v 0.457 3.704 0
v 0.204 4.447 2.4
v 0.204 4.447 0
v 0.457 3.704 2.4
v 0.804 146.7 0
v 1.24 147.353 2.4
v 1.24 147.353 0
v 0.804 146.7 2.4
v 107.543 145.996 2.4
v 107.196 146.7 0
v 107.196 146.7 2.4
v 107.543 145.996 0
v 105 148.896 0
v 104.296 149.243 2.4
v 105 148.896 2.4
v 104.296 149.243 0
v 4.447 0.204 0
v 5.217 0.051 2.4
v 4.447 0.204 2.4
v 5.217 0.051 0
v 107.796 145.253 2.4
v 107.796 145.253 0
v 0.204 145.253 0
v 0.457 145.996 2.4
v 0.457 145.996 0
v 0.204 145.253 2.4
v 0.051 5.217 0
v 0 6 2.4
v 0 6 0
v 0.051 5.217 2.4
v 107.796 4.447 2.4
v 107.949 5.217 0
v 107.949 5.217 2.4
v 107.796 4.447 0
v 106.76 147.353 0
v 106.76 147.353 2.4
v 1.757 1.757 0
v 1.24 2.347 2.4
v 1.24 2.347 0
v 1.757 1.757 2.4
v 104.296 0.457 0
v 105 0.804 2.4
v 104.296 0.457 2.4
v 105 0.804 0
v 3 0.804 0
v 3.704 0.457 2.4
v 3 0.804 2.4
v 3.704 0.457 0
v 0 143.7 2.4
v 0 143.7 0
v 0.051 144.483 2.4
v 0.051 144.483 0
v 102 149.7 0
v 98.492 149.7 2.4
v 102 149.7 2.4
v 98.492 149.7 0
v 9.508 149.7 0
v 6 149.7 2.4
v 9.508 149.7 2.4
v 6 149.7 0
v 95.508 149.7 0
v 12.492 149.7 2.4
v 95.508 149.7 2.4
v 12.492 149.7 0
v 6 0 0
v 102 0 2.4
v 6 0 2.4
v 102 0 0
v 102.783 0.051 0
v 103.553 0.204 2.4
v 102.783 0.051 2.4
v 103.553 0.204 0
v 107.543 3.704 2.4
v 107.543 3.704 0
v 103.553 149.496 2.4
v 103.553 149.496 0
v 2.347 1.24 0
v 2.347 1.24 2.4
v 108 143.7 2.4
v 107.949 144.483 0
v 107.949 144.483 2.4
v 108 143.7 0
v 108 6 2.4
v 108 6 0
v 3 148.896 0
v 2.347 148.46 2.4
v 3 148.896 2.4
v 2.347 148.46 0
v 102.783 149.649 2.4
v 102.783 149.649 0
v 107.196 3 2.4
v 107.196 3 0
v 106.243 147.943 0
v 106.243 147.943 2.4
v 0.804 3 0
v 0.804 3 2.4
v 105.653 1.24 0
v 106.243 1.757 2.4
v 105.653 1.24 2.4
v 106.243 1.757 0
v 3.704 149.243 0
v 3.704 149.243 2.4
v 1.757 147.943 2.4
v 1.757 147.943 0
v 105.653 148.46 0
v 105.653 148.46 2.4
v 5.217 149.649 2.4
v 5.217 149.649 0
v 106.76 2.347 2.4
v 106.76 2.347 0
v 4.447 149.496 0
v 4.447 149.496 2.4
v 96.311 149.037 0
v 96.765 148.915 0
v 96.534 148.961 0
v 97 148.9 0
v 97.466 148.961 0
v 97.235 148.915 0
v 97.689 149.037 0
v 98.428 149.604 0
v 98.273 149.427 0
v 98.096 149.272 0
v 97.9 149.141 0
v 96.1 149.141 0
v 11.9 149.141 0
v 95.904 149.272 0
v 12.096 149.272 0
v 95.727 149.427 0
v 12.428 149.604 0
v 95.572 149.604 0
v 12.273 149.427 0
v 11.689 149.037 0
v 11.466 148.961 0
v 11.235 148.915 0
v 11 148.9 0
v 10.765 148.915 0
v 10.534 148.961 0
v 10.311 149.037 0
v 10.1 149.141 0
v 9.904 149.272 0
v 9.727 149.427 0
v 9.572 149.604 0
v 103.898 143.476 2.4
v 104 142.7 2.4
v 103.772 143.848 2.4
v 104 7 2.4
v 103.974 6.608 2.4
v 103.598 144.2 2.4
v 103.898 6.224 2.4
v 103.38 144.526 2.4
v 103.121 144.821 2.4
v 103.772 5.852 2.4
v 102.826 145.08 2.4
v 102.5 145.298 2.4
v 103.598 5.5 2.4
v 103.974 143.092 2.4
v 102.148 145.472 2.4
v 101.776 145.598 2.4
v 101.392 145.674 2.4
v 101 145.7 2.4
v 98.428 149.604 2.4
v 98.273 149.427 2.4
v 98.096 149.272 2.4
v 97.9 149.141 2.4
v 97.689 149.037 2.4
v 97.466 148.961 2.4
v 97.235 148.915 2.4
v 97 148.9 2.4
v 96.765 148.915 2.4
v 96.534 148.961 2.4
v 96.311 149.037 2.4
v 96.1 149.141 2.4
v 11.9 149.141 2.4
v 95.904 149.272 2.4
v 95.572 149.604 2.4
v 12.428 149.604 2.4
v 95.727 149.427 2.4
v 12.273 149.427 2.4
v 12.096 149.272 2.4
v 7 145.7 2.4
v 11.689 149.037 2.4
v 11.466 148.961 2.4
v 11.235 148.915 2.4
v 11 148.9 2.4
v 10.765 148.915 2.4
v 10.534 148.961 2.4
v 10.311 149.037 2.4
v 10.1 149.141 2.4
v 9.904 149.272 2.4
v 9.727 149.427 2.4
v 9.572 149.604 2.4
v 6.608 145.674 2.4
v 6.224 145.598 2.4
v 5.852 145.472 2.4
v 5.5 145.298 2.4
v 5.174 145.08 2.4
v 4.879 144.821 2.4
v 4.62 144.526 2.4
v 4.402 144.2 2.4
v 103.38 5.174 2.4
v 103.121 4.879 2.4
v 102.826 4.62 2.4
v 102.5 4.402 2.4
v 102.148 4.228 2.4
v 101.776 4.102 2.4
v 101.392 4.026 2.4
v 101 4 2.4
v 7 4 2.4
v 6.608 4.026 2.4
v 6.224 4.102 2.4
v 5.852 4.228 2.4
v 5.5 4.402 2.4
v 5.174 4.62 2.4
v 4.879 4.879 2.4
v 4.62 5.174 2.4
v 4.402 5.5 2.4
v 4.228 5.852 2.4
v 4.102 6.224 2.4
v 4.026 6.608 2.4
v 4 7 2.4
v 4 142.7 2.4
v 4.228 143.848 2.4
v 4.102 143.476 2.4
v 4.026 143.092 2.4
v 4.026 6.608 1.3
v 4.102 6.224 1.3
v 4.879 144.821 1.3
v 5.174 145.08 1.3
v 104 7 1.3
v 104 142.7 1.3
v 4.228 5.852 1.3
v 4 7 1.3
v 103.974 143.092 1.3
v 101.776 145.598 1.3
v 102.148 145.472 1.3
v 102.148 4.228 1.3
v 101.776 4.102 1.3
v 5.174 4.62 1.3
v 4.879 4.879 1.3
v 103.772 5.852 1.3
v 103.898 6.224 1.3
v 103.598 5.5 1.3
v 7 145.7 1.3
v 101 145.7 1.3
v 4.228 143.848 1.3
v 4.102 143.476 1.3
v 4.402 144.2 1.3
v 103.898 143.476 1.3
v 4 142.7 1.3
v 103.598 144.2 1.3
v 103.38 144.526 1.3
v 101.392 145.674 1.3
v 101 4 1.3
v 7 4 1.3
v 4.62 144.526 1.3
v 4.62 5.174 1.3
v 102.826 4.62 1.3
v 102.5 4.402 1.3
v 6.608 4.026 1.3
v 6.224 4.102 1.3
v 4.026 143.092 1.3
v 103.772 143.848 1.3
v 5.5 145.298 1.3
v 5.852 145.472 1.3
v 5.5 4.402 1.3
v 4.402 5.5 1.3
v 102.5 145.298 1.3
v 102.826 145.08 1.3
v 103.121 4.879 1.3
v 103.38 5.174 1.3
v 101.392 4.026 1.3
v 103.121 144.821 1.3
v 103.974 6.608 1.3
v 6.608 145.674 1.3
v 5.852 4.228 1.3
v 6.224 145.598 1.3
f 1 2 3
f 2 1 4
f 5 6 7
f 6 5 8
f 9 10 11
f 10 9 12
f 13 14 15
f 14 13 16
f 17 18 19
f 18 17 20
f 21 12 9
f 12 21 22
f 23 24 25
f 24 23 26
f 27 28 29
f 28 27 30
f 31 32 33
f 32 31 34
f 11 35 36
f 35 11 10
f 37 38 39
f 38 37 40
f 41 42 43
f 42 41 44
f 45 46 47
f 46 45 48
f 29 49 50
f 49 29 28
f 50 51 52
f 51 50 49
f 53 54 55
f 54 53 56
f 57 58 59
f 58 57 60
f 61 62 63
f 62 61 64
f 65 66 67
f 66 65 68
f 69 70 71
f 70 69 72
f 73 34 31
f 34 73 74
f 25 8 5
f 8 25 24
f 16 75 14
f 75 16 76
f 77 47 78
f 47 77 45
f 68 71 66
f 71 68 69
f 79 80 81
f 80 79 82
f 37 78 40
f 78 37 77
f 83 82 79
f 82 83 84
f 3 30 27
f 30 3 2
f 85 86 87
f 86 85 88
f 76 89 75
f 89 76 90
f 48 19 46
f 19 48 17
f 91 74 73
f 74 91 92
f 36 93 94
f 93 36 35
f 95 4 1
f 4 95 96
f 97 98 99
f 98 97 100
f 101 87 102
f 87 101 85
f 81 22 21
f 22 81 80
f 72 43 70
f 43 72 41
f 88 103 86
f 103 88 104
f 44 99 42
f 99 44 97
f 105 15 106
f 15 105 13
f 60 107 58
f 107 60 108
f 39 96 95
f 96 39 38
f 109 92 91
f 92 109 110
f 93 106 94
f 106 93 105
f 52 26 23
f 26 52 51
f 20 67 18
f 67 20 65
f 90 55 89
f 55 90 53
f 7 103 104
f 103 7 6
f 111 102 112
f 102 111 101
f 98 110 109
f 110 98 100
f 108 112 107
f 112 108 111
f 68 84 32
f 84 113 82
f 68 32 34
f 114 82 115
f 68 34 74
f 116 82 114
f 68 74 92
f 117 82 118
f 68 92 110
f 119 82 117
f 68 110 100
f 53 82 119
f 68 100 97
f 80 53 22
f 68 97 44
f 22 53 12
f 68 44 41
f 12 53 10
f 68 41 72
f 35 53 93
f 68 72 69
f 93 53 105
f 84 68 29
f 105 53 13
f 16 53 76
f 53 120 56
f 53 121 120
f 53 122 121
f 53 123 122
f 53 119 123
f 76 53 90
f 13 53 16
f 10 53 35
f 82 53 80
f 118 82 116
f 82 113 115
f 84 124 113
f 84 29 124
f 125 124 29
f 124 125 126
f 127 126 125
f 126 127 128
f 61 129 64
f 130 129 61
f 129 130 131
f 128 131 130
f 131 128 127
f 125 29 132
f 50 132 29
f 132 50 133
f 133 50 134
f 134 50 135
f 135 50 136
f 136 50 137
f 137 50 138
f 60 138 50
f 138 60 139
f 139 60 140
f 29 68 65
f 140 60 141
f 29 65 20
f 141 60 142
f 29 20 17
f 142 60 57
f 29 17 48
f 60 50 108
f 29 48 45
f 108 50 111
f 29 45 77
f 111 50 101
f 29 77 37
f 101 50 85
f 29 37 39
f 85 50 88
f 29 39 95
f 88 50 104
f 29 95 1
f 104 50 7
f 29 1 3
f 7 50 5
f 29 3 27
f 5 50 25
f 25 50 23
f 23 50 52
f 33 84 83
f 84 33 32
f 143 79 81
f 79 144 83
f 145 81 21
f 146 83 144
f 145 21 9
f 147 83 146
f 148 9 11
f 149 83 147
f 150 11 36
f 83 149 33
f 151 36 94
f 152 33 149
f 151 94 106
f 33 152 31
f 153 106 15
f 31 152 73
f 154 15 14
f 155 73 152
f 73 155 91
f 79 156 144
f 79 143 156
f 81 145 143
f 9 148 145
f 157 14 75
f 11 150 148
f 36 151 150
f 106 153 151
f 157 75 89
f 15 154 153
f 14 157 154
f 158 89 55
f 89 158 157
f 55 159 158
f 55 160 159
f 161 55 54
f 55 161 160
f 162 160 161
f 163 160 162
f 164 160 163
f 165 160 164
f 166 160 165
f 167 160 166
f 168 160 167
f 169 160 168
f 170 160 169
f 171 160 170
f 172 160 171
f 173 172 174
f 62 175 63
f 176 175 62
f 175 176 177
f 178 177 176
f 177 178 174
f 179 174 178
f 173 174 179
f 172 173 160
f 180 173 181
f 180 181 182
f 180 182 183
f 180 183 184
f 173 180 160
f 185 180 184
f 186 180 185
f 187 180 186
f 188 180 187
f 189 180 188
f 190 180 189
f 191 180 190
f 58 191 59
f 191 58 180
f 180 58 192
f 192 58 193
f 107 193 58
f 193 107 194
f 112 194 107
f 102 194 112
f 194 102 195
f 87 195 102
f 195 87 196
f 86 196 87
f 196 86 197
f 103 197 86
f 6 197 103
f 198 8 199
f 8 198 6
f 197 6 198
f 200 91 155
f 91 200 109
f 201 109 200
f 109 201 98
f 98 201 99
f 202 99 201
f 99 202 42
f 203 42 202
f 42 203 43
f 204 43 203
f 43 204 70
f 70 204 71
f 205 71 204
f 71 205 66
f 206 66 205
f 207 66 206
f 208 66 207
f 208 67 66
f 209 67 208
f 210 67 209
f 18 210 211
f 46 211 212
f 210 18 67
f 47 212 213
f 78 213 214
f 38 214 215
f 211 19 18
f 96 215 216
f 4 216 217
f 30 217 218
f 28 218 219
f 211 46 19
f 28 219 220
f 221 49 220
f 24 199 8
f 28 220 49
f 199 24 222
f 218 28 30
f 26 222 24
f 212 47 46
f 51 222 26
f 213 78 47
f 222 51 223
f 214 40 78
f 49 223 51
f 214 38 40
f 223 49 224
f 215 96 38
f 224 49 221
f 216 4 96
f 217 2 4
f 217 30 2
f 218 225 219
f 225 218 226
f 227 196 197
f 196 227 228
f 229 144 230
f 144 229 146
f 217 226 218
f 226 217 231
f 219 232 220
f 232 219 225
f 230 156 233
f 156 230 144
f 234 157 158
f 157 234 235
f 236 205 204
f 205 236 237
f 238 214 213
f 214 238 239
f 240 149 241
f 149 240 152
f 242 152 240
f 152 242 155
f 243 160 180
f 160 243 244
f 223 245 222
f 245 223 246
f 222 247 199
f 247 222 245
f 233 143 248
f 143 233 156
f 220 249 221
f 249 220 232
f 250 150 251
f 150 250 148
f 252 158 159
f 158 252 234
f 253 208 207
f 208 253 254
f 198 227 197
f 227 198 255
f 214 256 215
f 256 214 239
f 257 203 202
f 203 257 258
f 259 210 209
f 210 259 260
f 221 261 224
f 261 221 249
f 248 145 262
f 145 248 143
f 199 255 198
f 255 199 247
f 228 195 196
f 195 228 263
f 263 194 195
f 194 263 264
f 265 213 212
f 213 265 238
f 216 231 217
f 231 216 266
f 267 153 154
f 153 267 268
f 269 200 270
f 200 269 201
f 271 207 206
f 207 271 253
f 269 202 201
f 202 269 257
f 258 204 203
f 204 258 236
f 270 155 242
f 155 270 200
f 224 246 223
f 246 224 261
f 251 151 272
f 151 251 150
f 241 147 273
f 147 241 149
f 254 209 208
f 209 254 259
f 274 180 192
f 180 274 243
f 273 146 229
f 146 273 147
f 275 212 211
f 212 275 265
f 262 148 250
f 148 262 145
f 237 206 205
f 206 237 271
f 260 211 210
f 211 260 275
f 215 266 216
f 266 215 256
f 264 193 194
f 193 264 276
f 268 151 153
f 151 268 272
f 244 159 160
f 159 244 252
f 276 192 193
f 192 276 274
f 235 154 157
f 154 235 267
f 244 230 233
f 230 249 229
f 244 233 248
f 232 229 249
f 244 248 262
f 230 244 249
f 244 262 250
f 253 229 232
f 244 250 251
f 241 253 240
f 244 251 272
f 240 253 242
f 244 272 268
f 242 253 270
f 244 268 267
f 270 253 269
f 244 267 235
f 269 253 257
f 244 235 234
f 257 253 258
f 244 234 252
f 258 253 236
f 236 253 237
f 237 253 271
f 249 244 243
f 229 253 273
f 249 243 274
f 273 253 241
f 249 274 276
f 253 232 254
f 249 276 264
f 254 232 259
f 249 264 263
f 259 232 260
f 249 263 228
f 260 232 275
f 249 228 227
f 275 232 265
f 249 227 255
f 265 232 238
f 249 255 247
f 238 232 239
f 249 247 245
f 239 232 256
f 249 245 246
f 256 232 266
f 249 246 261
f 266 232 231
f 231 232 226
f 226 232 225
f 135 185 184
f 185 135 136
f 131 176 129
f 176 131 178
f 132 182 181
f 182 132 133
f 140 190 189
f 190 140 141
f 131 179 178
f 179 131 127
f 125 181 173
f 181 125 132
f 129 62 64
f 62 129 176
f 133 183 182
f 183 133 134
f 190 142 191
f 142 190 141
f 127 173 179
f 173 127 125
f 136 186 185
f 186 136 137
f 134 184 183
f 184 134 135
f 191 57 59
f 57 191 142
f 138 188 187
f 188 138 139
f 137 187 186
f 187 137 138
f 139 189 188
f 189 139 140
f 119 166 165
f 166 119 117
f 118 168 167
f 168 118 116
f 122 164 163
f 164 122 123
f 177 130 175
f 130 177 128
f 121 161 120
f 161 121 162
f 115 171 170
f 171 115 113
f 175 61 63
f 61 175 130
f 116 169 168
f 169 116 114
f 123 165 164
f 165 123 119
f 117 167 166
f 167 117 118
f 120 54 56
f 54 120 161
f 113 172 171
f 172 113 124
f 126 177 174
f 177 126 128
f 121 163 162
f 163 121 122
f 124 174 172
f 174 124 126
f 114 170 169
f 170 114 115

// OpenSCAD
// Astro Reachy: marco para tarjeta QR 100 × 141,7 mm.
// Imprime QR en papel y pégalo en el rebaje: un QR 3D no da contraste/precisión fiables.
$fn=48; card_w=100; card_h=141.7; border=4; base_h=2.4; recess=1.1;
module rounded_rect(w,h,r){hull()for(x=[r,w-r],y=[r,h-r])translate([x,y])circle(r=r);}
difference(){
 linear_extrude(base_h)rounded_rect(card_w+2*border,card_h+2*border,6);
 translate([border,border,base_h-recess])linear_extrude(recess+.1)rounded_rect(card_w,card_h,3);
 translate([border+7,card_h+border+5,-.1])cylinder(h=base_h+.2,r=1.8);
 translate([card_w+border-7,card_h+border+5,-.1])cylinder(h=base_h+.2,r=1.8);
}
